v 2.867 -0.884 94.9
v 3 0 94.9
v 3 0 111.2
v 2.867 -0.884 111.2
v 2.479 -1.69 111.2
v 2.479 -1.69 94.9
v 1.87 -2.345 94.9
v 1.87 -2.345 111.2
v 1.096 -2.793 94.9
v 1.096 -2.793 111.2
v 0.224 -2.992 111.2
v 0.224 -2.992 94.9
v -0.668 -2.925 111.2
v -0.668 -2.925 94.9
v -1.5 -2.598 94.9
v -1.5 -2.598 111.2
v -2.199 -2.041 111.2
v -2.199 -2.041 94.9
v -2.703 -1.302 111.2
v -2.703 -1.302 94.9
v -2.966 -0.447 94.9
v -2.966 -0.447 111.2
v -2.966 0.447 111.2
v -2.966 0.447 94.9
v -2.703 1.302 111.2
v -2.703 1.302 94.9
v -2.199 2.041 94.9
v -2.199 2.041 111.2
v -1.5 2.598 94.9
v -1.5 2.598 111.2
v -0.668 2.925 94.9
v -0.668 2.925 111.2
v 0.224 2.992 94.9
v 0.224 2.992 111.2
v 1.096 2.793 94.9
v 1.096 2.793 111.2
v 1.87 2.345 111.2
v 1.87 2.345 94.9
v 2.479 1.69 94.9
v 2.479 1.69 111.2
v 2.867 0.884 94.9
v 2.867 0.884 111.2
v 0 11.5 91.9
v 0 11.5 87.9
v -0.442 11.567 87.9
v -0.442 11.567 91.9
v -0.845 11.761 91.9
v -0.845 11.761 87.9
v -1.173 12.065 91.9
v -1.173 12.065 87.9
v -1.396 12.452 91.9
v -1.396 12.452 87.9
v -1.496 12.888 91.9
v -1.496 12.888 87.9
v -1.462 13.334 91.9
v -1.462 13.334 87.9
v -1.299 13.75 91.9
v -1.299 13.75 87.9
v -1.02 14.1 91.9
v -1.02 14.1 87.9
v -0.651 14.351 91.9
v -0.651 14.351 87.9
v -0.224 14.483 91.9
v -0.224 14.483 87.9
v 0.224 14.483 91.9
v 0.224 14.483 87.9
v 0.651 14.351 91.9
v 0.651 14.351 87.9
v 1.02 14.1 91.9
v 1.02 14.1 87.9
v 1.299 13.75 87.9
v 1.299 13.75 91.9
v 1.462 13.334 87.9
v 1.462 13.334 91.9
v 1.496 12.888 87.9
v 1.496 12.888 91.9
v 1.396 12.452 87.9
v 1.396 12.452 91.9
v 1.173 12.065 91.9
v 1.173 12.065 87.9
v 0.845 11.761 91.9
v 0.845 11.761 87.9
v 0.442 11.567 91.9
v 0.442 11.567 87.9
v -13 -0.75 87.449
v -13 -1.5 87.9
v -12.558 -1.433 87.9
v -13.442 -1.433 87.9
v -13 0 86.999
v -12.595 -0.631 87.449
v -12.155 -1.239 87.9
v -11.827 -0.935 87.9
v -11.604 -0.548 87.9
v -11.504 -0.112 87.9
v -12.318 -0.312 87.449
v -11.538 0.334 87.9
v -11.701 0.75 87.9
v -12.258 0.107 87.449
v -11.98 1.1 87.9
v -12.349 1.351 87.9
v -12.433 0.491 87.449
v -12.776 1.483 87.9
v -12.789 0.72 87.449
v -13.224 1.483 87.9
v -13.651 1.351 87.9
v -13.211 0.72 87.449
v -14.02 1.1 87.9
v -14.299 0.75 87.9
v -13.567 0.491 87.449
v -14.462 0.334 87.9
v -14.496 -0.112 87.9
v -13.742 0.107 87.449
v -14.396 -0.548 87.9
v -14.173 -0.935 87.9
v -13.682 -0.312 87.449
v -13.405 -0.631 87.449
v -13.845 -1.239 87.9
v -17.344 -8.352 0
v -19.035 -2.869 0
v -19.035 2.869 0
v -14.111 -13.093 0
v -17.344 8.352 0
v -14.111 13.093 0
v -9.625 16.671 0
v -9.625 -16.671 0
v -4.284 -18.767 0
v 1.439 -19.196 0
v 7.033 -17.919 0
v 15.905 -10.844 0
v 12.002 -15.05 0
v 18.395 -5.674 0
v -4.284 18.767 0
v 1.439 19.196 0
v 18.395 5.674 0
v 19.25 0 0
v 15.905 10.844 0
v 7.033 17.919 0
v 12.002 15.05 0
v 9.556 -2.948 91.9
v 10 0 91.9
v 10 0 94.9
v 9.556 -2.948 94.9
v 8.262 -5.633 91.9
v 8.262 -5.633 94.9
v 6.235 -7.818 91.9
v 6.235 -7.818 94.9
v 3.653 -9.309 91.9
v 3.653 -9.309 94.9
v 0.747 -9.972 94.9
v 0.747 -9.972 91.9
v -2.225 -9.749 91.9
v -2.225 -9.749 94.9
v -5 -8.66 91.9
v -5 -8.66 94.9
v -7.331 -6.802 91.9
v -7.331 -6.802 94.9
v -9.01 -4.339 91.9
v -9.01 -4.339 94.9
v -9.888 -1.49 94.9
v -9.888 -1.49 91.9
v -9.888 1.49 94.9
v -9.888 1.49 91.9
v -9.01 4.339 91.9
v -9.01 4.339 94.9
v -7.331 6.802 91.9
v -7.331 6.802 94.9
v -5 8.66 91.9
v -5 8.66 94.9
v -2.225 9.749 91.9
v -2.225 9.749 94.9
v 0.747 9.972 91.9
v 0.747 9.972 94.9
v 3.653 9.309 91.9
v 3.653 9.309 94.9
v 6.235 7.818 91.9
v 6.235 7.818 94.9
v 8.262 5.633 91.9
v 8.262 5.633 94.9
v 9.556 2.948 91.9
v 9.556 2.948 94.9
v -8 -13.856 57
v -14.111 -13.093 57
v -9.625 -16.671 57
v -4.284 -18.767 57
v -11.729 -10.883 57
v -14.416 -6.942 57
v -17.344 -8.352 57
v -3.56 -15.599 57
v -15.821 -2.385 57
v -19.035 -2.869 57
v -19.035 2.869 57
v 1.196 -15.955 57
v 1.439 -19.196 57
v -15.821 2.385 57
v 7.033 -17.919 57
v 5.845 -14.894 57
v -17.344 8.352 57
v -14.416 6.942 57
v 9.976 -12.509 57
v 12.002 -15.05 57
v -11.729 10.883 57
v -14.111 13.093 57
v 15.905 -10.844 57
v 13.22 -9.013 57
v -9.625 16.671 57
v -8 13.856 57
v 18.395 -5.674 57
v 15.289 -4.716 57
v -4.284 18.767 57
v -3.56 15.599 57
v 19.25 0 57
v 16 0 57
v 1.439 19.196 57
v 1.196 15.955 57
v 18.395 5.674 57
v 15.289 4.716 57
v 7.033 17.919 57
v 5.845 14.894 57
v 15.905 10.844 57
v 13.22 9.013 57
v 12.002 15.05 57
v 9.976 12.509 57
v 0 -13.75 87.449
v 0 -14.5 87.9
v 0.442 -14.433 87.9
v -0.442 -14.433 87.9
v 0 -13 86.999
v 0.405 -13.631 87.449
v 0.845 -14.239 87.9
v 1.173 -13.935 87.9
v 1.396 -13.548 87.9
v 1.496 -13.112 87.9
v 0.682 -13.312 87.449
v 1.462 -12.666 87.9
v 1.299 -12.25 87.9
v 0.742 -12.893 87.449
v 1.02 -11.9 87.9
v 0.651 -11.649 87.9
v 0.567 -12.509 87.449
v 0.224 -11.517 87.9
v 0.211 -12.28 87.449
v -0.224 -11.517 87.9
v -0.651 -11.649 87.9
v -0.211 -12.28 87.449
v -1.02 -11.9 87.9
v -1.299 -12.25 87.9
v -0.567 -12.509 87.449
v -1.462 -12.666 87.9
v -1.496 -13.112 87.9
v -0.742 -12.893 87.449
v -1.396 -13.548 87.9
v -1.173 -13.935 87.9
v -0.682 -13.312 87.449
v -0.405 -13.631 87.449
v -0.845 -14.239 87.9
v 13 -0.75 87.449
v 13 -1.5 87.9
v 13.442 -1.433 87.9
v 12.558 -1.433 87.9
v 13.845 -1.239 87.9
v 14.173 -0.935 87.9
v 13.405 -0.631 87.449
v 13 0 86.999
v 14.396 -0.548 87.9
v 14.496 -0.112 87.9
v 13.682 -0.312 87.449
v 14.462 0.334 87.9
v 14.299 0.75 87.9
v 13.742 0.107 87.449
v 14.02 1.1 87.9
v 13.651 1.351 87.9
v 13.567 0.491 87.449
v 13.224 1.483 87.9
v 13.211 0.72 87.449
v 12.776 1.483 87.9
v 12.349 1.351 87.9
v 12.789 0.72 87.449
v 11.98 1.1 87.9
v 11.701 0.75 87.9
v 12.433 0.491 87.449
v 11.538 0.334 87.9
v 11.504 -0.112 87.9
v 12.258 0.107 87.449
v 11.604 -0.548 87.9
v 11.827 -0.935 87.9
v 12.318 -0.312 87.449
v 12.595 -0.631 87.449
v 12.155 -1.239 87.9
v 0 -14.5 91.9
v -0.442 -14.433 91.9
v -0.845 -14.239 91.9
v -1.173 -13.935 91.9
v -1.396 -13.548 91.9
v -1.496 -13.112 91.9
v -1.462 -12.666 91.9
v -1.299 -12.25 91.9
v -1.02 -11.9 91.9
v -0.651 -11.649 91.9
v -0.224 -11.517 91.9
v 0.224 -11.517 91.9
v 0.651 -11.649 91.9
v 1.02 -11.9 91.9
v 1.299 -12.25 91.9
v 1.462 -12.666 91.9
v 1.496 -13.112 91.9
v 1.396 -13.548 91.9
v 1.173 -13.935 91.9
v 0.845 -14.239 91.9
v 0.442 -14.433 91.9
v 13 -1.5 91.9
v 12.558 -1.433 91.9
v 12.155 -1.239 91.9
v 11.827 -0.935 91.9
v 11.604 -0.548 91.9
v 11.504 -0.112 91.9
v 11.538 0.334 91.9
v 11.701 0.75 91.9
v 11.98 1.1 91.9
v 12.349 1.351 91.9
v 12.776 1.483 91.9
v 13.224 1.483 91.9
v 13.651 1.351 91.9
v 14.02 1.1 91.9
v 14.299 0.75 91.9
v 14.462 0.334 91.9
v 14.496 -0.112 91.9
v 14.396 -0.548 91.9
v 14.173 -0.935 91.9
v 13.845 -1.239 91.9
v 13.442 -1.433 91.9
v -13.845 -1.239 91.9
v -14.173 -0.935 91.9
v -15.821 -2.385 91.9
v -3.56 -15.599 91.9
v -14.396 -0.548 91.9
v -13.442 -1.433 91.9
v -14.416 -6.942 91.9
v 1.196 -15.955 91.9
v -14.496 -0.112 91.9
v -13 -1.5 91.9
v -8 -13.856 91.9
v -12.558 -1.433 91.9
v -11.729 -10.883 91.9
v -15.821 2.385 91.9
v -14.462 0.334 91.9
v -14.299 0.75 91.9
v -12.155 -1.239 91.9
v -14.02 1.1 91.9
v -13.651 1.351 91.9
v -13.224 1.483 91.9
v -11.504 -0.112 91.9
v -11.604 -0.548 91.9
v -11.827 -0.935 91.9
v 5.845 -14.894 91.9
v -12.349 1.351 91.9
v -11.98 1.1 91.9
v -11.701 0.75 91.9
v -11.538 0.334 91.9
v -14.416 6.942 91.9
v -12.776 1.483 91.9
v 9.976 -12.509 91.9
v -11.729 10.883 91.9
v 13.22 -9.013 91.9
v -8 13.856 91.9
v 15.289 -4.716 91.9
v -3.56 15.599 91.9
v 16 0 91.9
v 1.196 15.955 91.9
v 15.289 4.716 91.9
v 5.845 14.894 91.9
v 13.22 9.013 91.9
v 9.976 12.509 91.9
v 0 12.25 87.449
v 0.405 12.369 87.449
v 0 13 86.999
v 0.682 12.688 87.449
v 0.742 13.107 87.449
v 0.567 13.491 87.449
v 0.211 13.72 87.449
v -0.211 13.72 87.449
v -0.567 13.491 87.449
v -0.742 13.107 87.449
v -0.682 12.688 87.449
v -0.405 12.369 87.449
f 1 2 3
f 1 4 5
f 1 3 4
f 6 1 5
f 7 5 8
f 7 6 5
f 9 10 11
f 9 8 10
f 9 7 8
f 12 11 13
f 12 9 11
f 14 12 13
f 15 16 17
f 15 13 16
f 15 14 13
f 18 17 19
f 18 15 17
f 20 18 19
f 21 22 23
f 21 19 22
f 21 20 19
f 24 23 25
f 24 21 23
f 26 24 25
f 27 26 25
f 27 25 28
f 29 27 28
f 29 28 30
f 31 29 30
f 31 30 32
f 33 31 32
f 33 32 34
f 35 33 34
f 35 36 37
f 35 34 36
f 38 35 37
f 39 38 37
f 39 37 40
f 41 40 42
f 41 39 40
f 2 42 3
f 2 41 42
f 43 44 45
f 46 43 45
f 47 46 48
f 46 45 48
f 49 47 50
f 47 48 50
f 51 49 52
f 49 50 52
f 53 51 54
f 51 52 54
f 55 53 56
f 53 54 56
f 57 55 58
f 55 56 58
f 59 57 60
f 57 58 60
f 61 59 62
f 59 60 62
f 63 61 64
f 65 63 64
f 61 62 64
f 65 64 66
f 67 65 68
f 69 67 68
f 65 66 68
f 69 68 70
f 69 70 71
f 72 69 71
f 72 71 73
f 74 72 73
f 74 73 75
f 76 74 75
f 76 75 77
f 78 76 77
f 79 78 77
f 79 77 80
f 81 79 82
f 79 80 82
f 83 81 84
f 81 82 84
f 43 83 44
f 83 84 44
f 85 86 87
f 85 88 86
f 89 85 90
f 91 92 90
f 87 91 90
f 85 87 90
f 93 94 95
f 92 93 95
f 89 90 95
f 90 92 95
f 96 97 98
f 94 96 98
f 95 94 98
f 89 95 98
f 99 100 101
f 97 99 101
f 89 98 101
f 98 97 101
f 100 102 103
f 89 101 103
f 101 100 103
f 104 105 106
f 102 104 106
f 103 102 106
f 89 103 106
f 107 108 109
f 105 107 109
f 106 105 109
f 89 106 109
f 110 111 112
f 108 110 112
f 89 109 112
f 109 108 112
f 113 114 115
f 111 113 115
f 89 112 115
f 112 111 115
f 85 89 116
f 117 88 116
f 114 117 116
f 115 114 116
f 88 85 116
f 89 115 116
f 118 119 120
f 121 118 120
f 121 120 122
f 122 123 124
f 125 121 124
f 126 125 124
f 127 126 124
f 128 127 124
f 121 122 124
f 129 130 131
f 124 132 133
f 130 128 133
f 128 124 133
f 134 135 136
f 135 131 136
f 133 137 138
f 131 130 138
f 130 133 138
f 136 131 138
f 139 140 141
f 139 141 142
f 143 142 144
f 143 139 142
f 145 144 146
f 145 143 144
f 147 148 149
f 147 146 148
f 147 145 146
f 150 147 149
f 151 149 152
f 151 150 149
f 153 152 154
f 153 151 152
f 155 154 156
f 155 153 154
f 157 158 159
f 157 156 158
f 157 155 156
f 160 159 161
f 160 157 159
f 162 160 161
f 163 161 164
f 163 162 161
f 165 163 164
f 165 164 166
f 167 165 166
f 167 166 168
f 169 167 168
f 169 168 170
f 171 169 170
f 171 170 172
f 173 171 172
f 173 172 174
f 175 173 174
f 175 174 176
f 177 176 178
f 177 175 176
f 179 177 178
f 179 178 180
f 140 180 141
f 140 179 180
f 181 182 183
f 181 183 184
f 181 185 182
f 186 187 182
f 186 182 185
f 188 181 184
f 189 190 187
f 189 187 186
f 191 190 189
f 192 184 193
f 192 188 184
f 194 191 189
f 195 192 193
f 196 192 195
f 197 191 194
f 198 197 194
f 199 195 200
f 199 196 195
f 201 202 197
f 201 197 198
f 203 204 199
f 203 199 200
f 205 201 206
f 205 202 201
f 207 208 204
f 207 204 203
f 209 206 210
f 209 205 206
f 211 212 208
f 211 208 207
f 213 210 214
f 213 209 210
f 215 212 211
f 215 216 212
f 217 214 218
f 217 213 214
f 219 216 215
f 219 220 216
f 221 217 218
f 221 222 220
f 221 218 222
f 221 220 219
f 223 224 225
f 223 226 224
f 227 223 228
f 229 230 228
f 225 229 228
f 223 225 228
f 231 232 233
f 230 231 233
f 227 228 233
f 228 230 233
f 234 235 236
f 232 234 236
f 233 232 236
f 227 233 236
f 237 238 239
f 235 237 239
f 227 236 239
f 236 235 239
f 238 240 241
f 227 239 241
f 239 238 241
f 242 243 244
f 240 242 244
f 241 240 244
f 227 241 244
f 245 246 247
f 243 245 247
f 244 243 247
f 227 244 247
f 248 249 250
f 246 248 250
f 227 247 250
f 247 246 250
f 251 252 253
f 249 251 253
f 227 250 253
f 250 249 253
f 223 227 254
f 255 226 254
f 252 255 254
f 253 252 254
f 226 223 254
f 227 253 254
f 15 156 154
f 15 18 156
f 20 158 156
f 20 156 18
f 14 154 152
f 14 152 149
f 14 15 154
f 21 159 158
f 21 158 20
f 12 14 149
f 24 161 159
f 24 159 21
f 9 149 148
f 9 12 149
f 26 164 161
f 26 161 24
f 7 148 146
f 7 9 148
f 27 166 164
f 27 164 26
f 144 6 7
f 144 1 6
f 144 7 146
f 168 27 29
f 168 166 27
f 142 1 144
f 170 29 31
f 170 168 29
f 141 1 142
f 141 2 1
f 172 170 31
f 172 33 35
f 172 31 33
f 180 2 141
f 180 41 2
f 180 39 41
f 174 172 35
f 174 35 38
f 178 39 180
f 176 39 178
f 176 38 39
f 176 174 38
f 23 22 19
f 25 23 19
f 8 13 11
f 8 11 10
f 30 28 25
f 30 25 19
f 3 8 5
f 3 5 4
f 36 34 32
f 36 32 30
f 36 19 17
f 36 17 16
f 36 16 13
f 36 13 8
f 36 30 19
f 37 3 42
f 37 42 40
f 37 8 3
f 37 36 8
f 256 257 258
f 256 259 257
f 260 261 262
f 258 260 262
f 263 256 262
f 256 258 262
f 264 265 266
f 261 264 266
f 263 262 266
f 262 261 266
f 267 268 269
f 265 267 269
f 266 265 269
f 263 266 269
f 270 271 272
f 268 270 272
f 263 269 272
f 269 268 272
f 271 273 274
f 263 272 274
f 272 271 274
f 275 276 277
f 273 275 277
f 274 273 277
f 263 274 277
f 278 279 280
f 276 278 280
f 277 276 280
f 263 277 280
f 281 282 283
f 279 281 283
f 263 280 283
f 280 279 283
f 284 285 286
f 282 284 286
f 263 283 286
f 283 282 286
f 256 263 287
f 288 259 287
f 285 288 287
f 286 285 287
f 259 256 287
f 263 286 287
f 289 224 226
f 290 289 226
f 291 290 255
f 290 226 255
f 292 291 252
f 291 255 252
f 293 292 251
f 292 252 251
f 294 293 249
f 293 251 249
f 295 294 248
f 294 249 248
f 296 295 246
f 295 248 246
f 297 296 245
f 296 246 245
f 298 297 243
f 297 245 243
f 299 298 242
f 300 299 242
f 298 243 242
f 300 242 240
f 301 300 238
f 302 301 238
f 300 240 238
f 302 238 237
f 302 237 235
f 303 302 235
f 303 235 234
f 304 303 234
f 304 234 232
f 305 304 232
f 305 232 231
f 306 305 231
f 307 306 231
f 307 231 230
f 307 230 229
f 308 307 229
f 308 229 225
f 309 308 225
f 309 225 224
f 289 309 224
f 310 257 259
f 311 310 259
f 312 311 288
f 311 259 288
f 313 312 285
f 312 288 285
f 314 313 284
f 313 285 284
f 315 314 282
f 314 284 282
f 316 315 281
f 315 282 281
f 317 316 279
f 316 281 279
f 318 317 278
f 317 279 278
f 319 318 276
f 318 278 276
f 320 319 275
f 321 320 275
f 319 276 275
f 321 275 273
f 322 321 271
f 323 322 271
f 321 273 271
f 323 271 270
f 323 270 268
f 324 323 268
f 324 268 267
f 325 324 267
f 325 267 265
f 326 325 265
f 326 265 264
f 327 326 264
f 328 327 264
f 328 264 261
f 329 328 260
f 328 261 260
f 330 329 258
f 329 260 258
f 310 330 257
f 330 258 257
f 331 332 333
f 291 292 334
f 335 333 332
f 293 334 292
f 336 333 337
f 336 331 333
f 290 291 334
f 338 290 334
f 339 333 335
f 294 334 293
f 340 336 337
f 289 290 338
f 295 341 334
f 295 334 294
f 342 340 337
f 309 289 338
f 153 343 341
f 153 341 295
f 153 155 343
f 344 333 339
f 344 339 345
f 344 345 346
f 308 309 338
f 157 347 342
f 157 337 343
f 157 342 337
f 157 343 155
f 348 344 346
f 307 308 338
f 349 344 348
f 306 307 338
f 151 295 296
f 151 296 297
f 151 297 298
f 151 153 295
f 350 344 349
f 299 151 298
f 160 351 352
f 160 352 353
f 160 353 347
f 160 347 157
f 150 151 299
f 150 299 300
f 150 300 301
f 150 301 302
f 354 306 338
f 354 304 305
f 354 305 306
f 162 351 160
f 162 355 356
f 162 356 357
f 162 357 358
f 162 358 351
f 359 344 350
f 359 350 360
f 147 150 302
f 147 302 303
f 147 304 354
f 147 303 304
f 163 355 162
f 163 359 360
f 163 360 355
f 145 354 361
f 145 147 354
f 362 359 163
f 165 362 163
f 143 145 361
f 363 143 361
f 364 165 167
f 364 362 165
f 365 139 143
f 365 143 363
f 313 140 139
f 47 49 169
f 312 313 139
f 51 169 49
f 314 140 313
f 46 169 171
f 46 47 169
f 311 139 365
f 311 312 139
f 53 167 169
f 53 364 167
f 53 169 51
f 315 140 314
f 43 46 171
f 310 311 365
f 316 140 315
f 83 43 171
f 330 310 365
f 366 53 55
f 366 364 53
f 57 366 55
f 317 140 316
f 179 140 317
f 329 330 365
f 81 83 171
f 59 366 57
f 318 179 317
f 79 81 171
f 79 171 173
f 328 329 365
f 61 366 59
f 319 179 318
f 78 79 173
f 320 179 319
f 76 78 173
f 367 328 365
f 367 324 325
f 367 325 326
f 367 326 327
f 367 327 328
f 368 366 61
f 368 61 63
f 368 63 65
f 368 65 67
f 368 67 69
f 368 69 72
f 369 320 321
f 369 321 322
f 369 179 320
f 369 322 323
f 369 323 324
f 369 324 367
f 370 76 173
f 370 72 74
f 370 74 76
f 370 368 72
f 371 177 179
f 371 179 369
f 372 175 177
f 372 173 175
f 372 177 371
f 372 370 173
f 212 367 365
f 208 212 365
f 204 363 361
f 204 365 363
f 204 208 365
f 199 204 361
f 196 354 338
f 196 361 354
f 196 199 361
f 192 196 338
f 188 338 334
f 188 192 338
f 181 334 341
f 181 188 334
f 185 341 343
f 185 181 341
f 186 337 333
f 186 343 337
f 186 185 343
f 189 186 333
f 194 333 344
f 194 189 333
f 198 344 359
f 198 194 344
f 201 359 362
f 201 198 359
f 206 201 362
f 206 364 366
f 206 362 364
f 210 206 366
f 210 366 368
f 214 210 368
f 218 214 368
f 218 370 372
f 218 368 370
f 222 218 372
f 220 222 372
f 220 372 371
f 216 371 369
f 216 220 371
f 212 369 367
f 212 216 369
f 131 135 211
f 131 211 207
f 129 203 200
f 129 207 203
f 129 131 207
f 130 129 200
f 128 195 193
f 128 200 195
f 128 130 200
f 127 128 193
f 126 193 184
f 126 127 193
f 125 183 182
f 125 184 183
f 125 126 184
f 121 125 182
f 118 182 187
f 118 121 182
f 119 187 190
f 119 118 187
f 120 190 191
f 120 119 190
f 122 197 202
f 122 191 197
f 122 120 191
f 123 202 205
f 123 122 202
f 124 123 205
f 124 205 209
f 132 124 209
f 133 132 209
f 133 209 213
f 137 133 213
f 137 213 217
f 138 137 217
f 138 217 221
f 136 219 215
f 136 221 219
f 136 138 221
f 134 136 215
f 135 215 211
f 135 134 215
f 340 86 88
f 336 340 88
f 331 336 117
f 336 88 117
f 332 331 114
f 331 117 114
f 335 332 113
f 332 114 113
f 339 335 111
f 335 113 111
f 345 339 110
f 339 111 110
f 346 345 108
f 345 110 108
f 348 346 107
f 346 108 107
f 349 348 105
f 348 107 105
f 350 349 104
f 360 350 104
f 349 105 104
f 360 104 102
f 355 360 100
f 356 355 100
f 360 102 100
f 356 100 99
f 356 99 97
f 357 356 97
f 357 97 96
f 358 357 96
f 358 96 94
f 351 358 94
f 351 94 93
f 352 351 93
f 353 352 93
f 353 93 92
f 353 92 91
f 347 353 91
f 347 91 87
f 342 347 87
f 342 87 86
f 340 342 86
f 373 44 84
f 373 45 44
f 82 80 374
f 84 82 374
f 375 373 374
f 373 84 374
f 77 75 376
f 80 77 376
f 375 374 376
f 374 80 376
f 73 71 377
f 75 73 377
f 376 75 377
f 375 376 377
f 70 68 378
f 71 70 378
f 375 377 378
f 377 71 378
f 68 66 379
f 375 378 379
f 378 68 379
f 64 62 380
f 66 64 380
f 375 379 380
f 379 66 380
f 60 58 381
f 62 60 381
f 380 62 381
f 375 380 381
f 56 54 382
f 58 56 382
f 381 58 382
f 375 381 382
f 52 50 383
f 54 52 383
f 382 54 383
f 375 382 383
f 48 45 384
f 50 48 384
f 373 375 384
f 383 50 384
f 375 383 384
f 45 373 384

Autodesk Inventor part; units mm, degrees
ref_plane "YZ Plane" through (0, 0, 0) normal (1, 0, 0) x (0, 1, 0)
ref_plane "XZ Plane" through (0, 0, 0) normal (0, 1, 0) x (-1, 0, 0)
ref_plane "XY Plane" through (0, 0, 0) normal (0, 0, 1) x (1, 0, 0)
sketch "スケッチ1" plane through (0, 0, 0) normal (0, 0, 1) x (1, 0, 0)
  circle A0 centre (0, 0) radius 19.25
  dimension "d0" = 38.5
extrude "押し出し1" add sketch "スケッチ1" along normal blind 57
sketch "スケッチ2" plane through (0, 0, 57) normal (0, 0, 1) x (1, 0, 0)
  circle A0 centre (0, 0) radius 16
  dimension "d3" = 32
extrude "押し出し2" add sketch "スケッチ2" along normal blind 34.9
sketch "スケッチ3" plane through (0, 0, 91.9) normal (0, 0, 1) x (1, 0, 0)
  circle A0 centre (0, 0) radius 3
  dimension "d6" = 6
extrude "押し出し3" add sketch "スケッチ3" along normal blind 19.3
sketch "スケッチ4" plane through (0, 0, 91.9) normal (0, 0, 1) x (1, 0, 0)
  circle A0 centre (0, 0) radius 3 projected
  circle A1 centre (0, 0) radius 10
  dimension "d9" = 20
extrude "押し出し4" add sketch "スケッチ4" along normal blind 3
sketch "スケッチ5" plane through (0, 0, 91.9) normal (0, 0, 1) x (1, 0, 0)
  circle A0 centre (0, 0) radius 3 projected
  circle A1 centre (0, 0) radius 13
  point P0 (0, 13)
  point P1 (-13, 0)
  point P2 (0, -13)
  point P3 (13, 0)
  dimension "d12" = 26
  dimension "d15" = 360
hole "穴1" at (0, 13, 91.9) at (-13, 0, 91.9) at (0, -13, 91.9) at (13, 0, 91.9) direction (0, 0, -1) diameter 3 depth 4 tip angle 118
properties part number "rs555vc5524"
